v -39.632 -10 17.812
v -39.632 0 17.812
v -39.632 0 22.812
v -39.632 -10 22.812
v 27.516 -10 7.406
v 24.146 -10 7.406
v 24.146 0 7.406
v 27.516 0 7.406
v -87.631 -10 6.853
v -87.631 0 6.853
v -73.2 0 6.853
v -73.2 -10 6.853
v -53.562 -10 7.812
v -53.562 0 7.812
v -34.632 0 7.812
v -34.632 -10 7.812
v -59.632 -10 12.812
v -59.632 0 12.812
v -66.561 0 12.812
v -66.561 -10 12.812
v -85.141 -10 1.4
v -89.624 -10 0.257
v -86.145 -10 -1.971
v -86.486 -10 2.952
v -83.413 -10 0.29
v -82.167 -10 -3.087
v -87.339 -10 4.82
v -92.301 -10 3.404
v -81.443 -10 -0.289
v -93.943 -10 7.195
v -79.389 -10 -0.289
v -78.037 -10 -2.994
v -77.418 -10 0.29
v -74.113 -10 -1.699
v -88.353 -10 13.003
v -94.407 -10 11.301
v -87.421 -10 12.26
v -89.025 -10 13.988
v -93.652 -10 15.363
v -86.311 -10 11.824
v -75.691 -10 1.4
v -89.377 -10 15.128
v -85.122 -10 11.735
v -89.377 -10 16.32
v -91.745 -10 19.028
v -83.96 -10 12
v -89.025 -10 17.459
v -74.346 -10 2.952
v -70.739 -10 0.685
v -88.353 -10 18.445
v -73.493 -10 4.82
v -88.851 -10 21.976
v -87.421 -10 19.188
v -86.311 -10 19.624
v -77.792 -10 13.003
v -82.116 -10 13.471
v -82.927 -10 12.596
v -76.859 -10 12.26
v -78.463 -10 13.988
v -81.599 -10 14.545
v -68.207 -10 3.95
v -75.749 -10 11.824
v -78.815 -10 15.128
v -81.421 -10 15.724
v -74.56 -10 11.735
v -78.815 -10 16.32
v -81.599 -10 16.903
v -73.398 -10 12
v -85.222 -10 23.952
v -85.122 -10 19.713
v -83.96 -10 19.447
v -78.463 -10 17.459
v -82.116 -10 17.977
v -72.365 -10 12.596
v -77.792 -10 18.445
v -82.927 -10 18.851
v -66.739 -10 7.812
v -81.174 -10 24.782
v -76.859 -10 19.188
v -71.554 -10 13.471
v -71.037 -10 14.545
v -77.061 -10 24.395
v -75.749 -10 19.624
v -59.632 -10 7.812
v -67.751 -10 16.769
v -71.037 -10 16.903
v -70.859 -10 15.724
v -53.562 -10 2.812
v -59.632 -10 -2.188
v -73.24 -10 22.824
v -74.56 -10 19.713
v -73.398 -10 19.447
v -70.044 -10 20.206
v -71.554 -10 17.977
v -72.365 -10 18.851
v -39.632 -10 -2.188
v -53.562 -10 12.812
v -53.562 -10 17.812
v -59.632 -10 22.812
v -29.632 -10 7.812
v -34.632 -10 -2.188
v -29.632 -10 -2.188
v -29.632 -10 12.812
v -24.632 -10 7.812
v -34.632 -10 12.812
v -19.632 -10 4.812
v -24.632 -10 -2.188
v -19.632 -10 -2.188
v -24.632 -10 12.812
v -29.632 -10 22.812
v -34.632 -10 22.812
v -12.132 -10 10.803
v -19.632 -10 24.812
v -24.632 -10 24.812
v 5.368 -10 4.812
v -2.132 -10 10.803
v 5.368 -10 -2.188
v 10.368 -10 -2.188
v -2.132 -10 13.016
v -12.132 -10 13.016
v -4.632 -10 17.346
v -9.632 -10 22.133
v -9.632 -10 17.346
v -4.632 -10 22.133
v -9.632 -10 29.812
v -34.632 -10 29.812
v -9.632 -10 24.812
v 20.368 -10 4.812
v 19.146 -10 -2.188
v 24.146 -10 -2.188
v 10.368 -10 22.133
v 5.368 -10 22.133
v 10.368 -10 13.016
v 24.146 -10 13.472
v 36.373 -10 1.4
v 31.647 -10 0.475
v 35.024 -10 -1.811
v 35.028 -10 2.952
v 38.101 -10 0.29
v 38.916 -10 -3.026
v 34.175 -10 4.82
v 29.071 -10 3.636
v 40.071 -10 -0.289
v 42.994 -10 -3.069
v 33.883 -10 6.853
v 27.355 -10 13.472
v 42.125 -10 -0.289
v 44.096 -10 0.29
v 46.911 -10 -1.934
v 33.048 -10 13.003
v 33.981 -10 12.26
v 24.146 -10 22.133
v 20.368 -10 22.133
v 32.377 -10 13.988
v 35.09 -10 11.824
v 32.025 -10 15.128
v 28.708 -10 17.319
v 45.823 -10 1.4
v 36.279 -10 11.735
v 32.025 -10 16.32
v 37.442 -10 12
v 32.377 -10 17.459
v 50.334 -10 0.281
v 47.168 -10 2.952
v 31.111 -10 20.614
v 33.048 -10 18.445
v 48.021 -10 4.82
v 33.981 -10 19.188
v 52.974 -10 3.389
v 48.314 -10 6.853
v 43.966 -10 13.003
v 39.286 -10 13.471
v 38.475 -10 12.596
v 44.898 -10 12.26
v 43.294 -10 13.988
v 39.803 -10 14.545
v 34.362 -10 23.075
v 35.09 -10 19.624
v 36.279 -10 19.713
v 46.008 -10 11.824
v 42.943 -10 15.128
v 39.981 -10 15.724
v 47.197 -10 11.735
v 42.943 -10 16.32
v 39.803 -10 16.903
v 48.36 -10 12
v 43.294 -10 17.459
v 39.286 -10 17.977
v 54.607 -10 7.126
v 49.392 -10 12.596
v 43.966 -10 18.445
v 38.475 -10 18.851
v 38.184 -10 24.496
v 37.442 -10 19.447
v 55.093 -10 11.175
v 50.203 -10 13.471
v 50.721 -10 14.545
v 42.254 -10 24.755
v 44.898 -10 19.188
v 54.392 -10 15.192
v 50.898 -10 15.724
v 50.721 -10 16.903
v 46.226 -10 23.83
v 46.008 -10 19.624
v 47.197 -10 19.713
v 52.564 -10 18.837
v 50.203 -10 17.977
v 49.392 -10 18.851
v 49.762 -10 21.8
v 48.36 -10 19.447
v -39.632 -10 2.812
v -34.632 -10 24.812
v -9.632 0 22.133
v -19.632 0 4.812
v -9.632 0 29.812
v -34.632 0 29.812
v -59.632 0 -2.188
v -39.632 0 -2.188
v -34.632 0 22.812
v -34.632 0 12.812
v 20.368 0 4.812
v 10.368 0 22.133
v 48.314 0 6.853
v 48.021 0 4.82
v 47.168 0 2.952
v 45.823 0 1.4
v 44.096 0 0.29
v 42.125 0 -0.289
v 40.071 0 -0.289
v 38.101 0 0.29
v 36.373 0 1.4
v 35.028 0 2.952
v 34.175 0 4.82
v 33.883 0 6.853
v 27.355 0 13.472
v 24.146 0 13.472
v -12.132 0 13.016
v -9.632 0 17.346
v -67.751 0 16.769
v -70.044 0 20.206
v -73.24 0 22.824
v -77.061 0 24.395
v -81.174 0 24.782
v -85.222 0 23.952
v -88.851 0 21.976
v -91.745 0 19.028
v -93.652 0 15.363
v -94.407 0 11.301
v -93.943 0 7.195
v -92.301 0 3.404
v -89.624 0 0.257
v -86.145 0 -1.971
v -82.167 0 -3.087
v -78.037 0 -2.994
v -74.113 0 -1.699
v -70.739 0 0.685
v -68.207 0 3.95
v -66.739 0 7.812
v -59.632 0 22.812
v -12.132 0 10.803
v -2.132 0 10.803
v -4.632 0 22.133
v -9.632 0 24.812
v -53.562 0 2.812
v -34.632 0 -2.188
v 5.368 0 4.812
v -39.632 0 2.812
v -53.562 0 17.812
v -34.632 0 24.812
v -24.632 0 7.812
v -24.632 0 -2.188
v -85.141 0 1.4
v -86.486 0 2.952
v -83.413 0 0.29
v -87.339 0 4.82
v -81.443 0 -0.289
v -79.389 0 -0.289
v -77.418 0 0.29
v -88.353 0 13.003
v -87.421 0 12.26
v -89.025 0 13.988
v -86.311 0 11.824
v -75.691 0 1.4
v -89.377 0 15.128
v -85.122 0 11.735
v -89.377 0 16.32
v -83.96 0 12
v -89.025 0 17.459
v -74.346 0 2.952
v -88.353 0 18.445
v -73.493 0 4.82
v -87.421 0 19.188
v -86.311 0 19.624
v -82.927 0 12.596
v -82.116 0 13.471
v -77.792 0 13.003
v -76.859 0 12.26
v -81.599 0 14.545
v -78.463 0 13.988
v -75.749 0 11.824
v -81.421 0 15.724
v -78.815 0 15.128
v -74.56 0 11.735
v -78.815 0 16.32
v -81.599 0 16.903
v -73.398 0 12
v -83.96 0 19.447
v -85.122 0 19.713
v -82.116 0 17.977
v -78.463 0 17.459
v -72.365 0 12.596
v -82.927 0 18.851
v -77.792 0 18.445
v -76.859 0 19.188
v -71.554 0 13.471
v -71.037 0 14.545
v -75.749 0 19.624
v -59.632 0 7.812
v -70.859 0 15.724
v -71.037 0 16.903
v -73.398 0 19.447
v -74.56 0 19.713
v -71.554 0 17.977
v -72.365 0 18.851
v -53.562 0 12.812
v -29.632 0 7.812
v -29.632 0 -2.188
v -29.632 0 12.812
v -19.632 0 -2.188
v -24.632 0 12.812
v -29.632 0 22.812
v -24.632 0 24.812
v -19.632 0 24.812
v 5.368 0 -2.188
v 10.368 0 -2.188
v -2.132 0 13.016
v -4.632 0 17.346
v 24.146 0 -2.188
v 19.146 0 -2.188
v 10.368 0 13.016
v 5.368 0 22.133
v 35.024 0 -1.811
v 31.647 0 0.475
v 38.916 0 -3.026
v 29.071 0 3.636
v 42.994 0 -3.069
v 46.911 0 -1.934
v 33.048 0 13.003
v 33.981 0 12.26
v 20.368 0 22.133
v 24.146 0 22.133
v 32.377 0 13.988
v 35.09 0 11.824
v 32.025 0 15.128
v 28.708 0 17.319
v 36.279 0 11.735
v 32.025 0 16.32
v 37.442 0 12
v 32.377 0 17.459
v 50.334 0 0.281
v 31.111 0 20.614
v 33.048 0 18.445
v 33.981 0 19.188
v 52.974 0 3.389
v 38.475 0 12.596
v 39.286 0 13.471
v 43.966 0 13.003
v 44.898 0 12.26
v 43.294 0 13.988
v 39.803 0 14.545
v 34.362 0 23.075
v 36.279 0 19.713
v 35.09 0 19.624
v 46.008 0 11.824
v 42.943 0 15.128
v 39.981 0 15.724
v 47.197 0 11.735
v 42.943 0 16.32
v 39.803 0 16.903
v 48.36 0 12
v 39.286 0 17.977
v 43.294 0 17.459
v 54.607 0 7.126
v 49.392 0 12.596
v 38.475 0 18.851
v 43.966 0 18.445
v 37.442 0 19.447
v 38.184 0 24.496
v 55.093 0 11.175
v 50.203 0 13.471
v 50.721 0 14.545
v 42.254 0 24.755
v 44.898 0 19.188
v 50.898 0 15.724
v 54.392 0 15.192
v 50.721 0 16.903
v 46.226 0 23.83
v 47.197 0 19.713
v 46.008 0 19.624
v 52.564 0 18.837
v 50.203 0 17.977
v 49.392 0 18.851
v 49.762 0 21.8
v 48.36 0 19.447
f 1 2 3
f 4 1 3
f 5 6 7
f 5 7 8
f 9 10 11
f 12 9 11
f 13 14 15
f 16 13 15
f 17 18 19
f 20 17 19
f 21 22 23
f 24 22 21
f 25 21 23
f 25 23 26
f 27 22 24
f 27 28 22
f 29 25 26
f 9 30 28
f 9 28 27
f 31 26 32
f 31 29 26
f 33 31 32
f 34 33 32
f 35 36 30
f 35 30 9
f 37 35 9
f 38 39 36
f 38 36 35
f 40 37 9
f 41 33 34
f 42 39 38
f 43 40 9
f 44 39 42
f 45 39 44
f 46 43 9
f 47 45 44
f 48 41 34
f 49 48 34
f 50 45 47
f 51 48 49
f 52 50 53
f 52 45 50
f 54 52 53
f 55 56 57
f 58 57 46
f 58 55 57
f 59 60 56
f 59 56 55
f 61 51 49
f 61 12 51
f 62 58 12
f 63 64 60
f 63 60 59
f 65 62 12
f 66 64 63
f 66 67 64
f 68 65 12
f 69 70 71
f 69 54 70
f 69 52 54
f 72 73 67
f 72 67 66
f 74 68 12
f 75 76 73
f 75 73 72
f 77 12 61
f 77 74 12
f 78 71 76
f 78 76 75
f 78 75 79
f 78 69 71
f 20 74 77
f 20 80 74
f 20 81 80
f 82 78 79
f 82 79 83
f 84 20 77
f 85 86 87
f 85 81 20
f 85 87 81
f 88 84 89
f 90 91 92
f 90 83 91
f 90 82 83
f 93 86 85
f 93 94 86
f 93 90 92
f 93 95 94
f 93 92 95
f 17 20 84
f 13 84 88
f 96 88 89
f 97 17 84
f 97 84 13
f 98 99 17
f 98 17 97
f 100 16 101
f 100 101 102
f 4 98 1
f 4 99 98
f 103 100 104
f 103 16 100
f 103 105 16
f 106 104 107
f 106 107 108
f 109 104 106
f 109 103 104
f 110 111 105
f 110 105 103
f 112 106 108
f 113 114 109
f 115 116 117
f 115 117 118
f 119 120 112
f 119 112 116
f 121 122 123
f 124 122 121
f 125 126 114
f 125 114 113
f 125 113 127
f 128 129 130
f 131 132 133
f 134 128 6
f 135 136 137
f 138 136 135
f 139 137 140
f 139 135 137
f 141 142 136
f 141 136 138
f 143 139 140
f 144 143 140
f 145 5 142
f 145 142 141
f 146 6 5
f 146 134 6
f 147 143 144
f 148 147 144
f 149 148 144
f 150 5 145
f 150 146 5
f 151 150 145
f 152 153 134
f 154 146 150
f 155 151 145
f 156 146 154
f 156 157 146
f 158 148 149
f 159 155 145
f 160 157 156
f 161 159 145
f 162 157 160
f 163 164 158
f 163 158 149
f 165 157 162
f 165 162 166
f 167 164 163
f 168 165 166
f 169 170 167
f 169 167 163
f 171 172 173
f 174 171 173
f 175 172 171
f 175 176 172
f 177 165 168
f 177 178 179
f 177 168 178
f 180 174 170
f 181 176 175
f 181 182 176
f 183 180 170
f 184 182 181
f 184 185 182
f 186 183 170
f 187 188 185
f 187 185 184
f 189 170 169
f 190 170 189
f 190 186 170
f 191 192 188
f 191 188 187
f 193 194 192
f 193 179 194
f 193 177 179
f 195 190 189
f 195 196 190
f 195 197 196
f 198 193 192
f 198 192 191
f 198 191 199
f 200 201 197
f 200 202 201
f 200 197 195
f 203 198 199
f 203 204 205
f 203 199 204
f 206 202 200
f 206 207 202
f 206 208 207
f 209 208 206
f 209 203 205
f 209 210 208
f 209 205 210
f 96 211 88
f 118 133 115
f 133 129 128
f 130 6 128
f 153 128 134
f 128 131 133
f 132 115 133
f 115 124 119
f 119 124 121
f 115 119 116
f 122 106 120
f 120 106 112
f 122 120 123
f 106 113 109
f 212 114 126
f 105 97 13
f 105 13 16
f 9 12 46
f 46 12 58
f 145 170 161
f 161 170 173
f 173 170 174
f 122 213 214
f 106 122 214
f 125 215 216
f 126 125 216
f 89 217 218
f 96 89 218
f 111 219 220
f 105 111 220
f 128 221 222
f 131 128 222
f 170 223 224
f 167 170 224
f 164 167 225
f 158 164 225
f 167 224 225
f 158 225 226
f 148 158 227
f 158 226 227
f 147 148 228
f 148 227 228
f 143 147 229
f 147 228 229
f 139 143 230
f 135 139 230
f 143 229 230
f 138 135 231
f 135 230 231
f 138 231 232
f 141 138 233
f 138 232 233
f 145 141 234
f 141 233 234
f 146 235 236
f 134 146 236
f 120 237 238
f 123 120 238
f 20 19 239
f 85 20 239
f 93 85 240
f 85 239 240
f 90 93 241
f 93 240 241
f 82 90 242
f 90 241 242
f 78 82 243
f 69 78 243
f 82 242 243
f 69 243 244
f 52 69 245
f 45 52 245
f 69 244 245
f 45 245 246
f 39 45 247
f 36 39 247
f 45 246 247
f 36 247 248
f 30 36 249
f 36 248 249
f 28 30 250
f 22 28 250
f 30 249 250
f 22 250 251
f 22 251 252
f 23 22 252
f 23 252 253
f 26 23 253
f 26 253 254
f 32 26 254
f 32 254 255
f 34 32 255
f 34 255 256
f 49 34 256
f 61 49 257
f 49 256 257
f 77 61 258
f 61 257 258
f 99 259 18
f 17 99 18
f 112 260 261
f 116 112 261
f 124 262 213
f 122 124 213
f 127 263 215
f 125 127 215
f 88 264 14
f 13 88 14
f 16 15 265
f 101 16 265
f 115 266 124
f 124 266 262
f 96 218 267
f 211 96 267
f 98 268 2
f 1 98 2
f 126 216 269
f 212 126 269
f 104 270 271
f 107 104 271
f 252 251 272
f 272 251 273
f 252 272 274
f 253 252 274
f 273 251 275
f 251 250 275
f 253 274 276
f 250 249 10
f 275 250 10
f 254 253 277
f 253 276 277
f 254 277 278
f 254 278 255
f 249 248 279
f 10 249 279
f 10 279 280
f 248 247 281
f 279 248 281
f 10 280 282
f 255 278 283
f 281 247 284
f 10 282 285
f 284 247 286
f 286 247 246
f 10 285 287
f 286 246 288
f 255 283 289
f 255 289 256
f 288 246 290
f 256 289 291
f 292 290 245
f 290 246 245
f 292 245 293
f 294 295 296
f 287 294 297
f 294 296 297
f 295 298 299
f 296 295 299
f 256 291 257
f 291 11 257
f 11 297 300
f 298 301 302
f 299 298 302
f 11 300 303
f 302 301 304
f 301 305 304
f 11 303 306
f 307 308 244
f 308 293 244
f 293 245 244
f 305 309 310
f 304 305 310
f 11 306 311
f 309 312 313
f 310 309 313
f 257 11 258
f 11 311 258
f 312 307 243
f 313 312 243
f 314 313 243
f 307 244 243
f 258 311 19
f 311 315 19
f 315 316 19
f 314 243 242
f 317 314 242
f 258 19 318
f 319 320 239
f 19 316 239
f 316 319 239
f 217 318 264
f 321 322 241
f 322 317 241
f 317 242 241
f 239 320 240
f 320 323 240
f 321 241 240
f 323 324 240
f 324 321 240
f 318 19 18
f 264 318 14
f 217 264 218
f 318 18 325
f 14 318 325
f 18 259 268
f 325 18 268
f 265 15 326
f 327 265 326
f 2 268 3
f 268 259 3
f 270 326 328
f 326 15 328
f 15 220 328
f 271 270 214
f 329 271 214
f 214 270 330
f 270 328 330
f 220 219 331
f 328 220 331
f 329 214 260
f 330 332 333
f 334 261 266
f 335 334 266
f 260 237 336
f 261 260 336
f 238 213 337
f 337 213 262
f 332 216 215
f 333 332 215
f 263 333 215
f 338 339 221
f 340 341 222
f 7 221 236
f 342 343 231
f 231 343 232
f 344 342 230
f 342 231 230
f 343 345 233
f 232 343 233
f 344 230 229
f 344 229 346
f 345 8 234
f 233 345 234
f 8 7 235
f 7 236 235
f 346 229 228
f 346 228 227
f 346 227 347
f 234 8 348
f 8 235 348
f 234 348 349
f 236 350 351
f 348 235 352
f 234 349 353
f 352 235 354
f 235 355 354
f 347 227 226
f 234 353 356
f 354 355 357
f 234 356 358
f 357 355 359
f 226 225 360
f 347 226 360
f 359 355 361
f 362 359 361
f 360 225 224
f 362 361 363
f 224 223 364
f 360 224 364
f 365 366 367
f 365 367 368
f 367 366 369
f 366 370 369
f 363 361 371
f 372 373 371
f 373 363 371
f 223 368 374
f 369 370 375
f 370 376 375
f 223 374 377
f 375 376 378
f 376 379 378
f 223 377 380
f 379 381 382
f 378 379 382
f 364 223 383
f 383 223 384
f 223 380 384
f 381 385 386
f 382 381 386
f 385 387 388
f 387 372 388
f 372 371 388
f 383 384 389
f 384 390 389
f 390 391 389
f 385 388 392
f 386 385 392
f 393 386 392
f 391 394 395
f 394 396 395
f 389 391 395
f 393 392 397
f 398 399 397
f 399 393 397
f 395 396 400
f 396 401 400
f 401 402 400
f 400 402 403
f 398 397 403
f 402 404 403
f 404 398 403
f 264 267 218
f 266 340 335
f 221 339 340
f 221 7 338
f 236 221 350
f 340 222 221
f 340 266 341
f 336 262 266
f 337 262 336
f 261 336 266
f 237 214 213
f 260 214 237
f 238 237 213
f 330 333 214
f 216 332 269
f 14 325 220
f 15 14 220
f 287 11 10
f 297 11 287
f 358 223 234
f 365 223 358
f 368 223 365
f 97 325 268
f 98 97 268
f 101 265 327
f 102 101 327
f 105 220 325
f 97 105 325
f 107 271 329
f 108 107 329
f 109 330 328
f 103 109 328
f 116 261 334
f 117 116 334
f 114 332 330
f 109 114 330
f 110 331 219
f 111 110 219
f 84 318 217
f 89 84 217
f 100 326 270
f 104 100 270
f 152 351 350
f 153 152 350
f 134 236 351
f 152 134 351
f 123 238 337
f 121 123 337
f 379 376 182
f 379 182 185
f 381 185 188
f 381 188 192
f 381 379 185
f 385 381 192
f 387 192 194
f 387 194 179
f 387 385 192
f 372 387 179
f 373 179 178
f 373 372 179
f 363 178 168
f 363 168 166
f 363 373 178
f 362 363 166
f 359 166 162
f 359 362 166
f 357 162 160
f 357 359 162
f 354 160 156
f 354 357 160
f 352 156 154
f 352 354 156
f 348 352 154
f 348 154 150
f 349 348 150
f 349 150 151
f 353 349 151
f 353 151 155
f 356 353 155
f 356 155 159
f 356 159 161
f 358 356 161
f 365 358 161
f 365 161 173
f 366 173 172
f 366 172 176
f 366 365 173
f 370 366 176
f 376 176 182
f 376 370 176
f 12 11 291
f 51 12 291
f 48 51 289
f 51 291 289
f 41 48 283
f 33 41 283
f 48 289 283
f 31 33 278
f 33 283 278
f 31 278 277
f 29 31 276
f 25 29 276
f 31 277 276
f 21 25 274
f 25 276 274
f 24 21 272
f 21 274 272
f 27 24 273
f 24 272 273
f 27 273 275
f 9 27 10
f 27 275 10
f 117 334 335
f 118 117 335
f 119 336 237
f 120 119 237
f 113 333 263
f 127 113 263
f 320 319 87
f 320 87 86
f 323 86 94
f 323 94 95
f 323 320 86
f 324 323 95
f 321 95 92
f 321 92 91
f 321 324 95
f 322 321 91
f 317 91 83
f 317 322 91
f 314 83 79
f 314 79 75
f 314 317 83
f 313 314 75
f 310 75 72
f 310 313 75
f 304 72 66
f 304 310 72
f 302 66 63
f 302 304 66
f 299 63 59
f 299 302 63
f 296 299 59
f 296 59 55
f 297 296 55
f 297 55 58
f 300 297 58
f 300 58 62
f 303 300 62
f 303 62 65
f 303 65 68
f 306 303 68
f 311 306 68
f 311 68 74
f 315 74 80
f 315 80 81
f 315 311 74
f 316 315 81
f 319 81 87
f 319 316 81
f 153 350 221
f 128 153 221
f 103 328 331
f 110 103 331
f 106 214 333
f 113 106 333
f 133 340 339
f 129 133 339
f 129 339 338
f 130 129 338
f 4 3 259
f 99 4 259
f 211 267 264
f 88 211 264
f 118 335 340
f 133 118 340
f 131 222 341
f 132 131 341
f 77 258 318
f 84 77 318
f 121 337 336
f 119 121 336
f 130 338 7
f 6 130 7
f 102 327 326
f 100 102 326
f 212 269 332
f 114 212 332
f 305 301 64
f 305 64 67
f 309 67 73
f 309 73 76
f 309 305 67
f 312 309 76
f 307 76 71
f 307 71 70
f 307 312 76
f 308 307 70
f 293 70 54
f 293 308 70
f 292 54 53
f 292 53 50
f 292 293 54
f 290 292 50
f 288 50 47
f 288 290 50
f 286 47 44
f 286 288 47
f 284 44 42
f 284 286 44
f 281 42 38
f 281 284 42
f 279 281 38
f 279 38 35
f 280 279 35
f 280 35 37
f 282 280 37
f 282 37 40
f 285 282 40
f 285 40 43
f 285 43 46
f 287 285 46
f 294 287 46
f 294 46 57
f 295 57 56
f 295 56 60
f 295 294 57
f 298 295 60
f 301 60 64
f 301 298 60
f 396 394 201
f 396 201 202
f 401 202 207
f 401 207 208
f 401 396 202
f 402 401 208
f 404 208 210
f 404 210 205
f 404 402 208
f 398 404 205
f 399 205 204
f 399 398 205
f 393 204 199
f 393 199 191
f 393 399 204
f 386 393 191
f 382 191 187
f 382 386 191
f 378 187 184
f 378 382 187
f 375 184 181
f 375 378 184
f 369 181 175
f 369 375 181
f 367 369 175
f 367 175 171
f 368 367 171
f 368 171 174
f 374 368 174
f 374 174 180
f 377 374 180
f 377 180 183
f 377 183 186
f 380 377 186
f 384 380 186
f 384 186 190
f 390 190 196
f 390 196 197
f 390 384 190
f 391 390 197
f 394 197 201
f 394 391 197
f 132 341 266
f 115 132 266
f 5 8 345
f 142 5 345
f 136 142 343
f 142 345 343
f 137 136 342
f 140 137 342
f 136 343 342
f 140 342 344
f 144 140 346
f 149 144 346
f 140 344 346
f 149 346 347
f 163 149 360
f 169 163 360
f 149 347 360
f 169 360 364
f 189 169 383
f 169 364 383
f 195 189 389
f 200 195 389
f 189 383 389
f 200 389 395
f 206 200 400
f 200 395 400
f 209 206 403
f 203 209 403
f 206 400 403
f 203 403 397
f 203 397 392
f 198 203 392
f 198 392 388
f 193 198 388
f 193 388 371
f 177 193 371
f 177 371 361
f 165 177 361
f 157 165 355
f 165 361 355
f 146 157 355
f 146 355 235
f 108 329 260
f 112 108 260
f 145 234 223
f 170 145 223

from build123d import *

# Parameters (mm, degrees)
F0_R     = 4.000037
F0_R_2   = 4
F1_DEPTH = 10


with BuildPart() as f1:
    # F0 (on Front) → F1 (new body)
    with BuildSketch(Plane.XZ):
        with BuildLine():
            Line((-53.562295, 17.812143), (-39.631873, 17.812143))
            Line((-39.631873, 17.812143), (-39.631873, 22.812143))
            Line((-39.631873, 22.812143), (-59.631873, 22.812143))
            Line((-59.631873, 22.812143), (-59.631873, 12.812143))
            Line((-59.631873, 12.812143), (-66.560792, 12.812143))
            ThreePointArc((-66.560792, 12.812143), (-94.406932, 11.300926), (-66.738905, 7.812143))
            Line((-66.738905, 7.812143), (-59.631873, 7.812143))
            Line((-59.631873, 7.812143), (-59.631873, -2.187857))
            Line((-59.631873, -2.187857), (-39.631873, -2.187857))
            Line((-39.631873, -2.187857), (-39.631873, 2.812143))
            Line((-39.631873, 2.812143), (-53.562295, 2.812143))
            Line((-53.562295, 2.812143), (-53.562295, 7.812143))
            Line((-53.562295, 7.812143), (-39.631873, 7.812143))
            Line((-39.631873, 7.812143), (-34.631873, 7.812143))
            Line((-34.631873, 7.812143), (-34.631873, -2.187857))
            Line((-34.631873, -2.187857), (-29.631873, -2.187857))
            Line((-29.631873, -2.187857), (-29.631873, 7.812143))
            Line((-29.631873, 7.812143), (-24.631873, 7.812143))
            Line((-24.631873, 7.812143), (-24.631873, -2.187857))
            Line((-24.631873, -2.187857), (-19.631873, -2.187857))
            Line((-19.631873, -2.187857), (-12.131873, 10.802524))
            Line((-12.131873, 10.802524), (-2.131873, 10.802524))
            Line((-2.131873, 10.802524), (5.368127, -2.187857))
            Line((5.368127, -2.187857), (10.368127, -2.187857))
            Line((10.368127, -2.187857), (10.368127, 13.015858))
            Line((10.368127, 13.015858), (19.145996, -2.187857))
            Line((19.145996, -2.187857), (24.145996, -2.187857))
            Line((24.145996, -2.187857), (24.145996, 7.406078))
            Line((24.145996, 7.406078), (27.516475, 7.406078))
            ThreePointArc((27.516475, 7.406078), (55.093287, 11.174656), (27.35517, 13.472397))
            Line((27.35517, 13.472397), (24.145996, 13.472397))
            Line((24.145996, 13.472397), (24.145996, 22.132651))
            Line((24.145996, 22.132651), (20.368127, 22.132651))
            Line((20.368127, 22.132651), (20.368127, 4.812143))
            Line((20.368127, 4.812143), (10.368127, 22.132651))
            Line((10.368127, 22.132651), (5.368127, 22.132651))
            Line((5.368127, 22.132651), (5.368127, 6.907172))
            Line((5.368127, 6.907172), (5.368127, 4.812143))
            Line((5.368127, 4.812143), (-4.631873, 22.132651))
            Line((-4.631873, 22.132651), (-9.631873, 22.132651))
            Line((-9.631873, 22.132651), (-19.631873, 4.812143))
            Line((-19.631873, 4.812143), (-19.631873, 6.907172))
            Line((-19.631873, 6.907172), (-19.631873, 24.812143))
            Line((-19.631873, 24.812143), (-9.631873, 24.812143))
            Line((-9.631873, 24.812143), (-9.631873, 29.812143))
            Line((-9.631873, 29.812143), (-34.631873, 29.812143))
            Line((-34.631873, 29.812143), (-34.631873, 24.812143))
            Line((-34.631873, 24.812143), (-24.631873, 24.812143))
            Line((-24.631873, 24.812143), (-24.631873, 12.812143))
            Line((-24.631873, 12.812143), (-29.631873, 12.812143))
            Line((-29.631873, 12.812143), (-29.631873, 22.812143))
            Line((-29.631873, 22.812143), (-34.631873, 22.812143))
            Line((-34.631873, 22.812143), (-34.631873, 12.812143))
            Line((-34.631873, 12.812143), (-39.631873, 12.812143))
            Line((-39.631873, 12.812143), (-53.562295, 12.812143))
            Line((-53.562295, 12.812143), (-53.562295, 17.812143))
        make_face()
        with BuildLine():
            ThreePointArc((-73.200306, 6.85316), (-80.415806, -0.36234), (-87.631306, 6.85316))
            Line((-87.631306, 6.85316), (-73.200306, 6.85316))
        make_face(mode=Mode.SUBTRACT)
        with BuildLine():
            ThreePointArc((48.313583, 6.85316), (41.098233, -0.36219), (33.882884, 6.85316))
            Line((33.882884, 6.85316), (48.313583, 6.85316))
        make_face(mode=Mode.SUBTRACT)
        with Locations((-85.42119, 15.723815)):
            Circle(F0_R, mode=Mode.SUBTRACT)
        with Locations((-74.859366, 15.723815)):
            Circle(F0_R_2, mode=Mode.SUBTRACT)
        Polygon((-9.631873, 17.345985), (-4.631873, 17.345985), (-2.131873, 13.015858), (-12.131873, 13.015858), align=None, mode=Mode.SUBTRACT)
        with Locations((35.980549, 15.723815)):
            Circle(F0_R_2, mode=Mode.SUBTRACT)
        with Locations((46.898279, 15.723815)):
            Circle(F0_R_2, mode=Mode.SUBTRACT)
    extrude(amount=F1_DEPTH)


solid = f1.part
